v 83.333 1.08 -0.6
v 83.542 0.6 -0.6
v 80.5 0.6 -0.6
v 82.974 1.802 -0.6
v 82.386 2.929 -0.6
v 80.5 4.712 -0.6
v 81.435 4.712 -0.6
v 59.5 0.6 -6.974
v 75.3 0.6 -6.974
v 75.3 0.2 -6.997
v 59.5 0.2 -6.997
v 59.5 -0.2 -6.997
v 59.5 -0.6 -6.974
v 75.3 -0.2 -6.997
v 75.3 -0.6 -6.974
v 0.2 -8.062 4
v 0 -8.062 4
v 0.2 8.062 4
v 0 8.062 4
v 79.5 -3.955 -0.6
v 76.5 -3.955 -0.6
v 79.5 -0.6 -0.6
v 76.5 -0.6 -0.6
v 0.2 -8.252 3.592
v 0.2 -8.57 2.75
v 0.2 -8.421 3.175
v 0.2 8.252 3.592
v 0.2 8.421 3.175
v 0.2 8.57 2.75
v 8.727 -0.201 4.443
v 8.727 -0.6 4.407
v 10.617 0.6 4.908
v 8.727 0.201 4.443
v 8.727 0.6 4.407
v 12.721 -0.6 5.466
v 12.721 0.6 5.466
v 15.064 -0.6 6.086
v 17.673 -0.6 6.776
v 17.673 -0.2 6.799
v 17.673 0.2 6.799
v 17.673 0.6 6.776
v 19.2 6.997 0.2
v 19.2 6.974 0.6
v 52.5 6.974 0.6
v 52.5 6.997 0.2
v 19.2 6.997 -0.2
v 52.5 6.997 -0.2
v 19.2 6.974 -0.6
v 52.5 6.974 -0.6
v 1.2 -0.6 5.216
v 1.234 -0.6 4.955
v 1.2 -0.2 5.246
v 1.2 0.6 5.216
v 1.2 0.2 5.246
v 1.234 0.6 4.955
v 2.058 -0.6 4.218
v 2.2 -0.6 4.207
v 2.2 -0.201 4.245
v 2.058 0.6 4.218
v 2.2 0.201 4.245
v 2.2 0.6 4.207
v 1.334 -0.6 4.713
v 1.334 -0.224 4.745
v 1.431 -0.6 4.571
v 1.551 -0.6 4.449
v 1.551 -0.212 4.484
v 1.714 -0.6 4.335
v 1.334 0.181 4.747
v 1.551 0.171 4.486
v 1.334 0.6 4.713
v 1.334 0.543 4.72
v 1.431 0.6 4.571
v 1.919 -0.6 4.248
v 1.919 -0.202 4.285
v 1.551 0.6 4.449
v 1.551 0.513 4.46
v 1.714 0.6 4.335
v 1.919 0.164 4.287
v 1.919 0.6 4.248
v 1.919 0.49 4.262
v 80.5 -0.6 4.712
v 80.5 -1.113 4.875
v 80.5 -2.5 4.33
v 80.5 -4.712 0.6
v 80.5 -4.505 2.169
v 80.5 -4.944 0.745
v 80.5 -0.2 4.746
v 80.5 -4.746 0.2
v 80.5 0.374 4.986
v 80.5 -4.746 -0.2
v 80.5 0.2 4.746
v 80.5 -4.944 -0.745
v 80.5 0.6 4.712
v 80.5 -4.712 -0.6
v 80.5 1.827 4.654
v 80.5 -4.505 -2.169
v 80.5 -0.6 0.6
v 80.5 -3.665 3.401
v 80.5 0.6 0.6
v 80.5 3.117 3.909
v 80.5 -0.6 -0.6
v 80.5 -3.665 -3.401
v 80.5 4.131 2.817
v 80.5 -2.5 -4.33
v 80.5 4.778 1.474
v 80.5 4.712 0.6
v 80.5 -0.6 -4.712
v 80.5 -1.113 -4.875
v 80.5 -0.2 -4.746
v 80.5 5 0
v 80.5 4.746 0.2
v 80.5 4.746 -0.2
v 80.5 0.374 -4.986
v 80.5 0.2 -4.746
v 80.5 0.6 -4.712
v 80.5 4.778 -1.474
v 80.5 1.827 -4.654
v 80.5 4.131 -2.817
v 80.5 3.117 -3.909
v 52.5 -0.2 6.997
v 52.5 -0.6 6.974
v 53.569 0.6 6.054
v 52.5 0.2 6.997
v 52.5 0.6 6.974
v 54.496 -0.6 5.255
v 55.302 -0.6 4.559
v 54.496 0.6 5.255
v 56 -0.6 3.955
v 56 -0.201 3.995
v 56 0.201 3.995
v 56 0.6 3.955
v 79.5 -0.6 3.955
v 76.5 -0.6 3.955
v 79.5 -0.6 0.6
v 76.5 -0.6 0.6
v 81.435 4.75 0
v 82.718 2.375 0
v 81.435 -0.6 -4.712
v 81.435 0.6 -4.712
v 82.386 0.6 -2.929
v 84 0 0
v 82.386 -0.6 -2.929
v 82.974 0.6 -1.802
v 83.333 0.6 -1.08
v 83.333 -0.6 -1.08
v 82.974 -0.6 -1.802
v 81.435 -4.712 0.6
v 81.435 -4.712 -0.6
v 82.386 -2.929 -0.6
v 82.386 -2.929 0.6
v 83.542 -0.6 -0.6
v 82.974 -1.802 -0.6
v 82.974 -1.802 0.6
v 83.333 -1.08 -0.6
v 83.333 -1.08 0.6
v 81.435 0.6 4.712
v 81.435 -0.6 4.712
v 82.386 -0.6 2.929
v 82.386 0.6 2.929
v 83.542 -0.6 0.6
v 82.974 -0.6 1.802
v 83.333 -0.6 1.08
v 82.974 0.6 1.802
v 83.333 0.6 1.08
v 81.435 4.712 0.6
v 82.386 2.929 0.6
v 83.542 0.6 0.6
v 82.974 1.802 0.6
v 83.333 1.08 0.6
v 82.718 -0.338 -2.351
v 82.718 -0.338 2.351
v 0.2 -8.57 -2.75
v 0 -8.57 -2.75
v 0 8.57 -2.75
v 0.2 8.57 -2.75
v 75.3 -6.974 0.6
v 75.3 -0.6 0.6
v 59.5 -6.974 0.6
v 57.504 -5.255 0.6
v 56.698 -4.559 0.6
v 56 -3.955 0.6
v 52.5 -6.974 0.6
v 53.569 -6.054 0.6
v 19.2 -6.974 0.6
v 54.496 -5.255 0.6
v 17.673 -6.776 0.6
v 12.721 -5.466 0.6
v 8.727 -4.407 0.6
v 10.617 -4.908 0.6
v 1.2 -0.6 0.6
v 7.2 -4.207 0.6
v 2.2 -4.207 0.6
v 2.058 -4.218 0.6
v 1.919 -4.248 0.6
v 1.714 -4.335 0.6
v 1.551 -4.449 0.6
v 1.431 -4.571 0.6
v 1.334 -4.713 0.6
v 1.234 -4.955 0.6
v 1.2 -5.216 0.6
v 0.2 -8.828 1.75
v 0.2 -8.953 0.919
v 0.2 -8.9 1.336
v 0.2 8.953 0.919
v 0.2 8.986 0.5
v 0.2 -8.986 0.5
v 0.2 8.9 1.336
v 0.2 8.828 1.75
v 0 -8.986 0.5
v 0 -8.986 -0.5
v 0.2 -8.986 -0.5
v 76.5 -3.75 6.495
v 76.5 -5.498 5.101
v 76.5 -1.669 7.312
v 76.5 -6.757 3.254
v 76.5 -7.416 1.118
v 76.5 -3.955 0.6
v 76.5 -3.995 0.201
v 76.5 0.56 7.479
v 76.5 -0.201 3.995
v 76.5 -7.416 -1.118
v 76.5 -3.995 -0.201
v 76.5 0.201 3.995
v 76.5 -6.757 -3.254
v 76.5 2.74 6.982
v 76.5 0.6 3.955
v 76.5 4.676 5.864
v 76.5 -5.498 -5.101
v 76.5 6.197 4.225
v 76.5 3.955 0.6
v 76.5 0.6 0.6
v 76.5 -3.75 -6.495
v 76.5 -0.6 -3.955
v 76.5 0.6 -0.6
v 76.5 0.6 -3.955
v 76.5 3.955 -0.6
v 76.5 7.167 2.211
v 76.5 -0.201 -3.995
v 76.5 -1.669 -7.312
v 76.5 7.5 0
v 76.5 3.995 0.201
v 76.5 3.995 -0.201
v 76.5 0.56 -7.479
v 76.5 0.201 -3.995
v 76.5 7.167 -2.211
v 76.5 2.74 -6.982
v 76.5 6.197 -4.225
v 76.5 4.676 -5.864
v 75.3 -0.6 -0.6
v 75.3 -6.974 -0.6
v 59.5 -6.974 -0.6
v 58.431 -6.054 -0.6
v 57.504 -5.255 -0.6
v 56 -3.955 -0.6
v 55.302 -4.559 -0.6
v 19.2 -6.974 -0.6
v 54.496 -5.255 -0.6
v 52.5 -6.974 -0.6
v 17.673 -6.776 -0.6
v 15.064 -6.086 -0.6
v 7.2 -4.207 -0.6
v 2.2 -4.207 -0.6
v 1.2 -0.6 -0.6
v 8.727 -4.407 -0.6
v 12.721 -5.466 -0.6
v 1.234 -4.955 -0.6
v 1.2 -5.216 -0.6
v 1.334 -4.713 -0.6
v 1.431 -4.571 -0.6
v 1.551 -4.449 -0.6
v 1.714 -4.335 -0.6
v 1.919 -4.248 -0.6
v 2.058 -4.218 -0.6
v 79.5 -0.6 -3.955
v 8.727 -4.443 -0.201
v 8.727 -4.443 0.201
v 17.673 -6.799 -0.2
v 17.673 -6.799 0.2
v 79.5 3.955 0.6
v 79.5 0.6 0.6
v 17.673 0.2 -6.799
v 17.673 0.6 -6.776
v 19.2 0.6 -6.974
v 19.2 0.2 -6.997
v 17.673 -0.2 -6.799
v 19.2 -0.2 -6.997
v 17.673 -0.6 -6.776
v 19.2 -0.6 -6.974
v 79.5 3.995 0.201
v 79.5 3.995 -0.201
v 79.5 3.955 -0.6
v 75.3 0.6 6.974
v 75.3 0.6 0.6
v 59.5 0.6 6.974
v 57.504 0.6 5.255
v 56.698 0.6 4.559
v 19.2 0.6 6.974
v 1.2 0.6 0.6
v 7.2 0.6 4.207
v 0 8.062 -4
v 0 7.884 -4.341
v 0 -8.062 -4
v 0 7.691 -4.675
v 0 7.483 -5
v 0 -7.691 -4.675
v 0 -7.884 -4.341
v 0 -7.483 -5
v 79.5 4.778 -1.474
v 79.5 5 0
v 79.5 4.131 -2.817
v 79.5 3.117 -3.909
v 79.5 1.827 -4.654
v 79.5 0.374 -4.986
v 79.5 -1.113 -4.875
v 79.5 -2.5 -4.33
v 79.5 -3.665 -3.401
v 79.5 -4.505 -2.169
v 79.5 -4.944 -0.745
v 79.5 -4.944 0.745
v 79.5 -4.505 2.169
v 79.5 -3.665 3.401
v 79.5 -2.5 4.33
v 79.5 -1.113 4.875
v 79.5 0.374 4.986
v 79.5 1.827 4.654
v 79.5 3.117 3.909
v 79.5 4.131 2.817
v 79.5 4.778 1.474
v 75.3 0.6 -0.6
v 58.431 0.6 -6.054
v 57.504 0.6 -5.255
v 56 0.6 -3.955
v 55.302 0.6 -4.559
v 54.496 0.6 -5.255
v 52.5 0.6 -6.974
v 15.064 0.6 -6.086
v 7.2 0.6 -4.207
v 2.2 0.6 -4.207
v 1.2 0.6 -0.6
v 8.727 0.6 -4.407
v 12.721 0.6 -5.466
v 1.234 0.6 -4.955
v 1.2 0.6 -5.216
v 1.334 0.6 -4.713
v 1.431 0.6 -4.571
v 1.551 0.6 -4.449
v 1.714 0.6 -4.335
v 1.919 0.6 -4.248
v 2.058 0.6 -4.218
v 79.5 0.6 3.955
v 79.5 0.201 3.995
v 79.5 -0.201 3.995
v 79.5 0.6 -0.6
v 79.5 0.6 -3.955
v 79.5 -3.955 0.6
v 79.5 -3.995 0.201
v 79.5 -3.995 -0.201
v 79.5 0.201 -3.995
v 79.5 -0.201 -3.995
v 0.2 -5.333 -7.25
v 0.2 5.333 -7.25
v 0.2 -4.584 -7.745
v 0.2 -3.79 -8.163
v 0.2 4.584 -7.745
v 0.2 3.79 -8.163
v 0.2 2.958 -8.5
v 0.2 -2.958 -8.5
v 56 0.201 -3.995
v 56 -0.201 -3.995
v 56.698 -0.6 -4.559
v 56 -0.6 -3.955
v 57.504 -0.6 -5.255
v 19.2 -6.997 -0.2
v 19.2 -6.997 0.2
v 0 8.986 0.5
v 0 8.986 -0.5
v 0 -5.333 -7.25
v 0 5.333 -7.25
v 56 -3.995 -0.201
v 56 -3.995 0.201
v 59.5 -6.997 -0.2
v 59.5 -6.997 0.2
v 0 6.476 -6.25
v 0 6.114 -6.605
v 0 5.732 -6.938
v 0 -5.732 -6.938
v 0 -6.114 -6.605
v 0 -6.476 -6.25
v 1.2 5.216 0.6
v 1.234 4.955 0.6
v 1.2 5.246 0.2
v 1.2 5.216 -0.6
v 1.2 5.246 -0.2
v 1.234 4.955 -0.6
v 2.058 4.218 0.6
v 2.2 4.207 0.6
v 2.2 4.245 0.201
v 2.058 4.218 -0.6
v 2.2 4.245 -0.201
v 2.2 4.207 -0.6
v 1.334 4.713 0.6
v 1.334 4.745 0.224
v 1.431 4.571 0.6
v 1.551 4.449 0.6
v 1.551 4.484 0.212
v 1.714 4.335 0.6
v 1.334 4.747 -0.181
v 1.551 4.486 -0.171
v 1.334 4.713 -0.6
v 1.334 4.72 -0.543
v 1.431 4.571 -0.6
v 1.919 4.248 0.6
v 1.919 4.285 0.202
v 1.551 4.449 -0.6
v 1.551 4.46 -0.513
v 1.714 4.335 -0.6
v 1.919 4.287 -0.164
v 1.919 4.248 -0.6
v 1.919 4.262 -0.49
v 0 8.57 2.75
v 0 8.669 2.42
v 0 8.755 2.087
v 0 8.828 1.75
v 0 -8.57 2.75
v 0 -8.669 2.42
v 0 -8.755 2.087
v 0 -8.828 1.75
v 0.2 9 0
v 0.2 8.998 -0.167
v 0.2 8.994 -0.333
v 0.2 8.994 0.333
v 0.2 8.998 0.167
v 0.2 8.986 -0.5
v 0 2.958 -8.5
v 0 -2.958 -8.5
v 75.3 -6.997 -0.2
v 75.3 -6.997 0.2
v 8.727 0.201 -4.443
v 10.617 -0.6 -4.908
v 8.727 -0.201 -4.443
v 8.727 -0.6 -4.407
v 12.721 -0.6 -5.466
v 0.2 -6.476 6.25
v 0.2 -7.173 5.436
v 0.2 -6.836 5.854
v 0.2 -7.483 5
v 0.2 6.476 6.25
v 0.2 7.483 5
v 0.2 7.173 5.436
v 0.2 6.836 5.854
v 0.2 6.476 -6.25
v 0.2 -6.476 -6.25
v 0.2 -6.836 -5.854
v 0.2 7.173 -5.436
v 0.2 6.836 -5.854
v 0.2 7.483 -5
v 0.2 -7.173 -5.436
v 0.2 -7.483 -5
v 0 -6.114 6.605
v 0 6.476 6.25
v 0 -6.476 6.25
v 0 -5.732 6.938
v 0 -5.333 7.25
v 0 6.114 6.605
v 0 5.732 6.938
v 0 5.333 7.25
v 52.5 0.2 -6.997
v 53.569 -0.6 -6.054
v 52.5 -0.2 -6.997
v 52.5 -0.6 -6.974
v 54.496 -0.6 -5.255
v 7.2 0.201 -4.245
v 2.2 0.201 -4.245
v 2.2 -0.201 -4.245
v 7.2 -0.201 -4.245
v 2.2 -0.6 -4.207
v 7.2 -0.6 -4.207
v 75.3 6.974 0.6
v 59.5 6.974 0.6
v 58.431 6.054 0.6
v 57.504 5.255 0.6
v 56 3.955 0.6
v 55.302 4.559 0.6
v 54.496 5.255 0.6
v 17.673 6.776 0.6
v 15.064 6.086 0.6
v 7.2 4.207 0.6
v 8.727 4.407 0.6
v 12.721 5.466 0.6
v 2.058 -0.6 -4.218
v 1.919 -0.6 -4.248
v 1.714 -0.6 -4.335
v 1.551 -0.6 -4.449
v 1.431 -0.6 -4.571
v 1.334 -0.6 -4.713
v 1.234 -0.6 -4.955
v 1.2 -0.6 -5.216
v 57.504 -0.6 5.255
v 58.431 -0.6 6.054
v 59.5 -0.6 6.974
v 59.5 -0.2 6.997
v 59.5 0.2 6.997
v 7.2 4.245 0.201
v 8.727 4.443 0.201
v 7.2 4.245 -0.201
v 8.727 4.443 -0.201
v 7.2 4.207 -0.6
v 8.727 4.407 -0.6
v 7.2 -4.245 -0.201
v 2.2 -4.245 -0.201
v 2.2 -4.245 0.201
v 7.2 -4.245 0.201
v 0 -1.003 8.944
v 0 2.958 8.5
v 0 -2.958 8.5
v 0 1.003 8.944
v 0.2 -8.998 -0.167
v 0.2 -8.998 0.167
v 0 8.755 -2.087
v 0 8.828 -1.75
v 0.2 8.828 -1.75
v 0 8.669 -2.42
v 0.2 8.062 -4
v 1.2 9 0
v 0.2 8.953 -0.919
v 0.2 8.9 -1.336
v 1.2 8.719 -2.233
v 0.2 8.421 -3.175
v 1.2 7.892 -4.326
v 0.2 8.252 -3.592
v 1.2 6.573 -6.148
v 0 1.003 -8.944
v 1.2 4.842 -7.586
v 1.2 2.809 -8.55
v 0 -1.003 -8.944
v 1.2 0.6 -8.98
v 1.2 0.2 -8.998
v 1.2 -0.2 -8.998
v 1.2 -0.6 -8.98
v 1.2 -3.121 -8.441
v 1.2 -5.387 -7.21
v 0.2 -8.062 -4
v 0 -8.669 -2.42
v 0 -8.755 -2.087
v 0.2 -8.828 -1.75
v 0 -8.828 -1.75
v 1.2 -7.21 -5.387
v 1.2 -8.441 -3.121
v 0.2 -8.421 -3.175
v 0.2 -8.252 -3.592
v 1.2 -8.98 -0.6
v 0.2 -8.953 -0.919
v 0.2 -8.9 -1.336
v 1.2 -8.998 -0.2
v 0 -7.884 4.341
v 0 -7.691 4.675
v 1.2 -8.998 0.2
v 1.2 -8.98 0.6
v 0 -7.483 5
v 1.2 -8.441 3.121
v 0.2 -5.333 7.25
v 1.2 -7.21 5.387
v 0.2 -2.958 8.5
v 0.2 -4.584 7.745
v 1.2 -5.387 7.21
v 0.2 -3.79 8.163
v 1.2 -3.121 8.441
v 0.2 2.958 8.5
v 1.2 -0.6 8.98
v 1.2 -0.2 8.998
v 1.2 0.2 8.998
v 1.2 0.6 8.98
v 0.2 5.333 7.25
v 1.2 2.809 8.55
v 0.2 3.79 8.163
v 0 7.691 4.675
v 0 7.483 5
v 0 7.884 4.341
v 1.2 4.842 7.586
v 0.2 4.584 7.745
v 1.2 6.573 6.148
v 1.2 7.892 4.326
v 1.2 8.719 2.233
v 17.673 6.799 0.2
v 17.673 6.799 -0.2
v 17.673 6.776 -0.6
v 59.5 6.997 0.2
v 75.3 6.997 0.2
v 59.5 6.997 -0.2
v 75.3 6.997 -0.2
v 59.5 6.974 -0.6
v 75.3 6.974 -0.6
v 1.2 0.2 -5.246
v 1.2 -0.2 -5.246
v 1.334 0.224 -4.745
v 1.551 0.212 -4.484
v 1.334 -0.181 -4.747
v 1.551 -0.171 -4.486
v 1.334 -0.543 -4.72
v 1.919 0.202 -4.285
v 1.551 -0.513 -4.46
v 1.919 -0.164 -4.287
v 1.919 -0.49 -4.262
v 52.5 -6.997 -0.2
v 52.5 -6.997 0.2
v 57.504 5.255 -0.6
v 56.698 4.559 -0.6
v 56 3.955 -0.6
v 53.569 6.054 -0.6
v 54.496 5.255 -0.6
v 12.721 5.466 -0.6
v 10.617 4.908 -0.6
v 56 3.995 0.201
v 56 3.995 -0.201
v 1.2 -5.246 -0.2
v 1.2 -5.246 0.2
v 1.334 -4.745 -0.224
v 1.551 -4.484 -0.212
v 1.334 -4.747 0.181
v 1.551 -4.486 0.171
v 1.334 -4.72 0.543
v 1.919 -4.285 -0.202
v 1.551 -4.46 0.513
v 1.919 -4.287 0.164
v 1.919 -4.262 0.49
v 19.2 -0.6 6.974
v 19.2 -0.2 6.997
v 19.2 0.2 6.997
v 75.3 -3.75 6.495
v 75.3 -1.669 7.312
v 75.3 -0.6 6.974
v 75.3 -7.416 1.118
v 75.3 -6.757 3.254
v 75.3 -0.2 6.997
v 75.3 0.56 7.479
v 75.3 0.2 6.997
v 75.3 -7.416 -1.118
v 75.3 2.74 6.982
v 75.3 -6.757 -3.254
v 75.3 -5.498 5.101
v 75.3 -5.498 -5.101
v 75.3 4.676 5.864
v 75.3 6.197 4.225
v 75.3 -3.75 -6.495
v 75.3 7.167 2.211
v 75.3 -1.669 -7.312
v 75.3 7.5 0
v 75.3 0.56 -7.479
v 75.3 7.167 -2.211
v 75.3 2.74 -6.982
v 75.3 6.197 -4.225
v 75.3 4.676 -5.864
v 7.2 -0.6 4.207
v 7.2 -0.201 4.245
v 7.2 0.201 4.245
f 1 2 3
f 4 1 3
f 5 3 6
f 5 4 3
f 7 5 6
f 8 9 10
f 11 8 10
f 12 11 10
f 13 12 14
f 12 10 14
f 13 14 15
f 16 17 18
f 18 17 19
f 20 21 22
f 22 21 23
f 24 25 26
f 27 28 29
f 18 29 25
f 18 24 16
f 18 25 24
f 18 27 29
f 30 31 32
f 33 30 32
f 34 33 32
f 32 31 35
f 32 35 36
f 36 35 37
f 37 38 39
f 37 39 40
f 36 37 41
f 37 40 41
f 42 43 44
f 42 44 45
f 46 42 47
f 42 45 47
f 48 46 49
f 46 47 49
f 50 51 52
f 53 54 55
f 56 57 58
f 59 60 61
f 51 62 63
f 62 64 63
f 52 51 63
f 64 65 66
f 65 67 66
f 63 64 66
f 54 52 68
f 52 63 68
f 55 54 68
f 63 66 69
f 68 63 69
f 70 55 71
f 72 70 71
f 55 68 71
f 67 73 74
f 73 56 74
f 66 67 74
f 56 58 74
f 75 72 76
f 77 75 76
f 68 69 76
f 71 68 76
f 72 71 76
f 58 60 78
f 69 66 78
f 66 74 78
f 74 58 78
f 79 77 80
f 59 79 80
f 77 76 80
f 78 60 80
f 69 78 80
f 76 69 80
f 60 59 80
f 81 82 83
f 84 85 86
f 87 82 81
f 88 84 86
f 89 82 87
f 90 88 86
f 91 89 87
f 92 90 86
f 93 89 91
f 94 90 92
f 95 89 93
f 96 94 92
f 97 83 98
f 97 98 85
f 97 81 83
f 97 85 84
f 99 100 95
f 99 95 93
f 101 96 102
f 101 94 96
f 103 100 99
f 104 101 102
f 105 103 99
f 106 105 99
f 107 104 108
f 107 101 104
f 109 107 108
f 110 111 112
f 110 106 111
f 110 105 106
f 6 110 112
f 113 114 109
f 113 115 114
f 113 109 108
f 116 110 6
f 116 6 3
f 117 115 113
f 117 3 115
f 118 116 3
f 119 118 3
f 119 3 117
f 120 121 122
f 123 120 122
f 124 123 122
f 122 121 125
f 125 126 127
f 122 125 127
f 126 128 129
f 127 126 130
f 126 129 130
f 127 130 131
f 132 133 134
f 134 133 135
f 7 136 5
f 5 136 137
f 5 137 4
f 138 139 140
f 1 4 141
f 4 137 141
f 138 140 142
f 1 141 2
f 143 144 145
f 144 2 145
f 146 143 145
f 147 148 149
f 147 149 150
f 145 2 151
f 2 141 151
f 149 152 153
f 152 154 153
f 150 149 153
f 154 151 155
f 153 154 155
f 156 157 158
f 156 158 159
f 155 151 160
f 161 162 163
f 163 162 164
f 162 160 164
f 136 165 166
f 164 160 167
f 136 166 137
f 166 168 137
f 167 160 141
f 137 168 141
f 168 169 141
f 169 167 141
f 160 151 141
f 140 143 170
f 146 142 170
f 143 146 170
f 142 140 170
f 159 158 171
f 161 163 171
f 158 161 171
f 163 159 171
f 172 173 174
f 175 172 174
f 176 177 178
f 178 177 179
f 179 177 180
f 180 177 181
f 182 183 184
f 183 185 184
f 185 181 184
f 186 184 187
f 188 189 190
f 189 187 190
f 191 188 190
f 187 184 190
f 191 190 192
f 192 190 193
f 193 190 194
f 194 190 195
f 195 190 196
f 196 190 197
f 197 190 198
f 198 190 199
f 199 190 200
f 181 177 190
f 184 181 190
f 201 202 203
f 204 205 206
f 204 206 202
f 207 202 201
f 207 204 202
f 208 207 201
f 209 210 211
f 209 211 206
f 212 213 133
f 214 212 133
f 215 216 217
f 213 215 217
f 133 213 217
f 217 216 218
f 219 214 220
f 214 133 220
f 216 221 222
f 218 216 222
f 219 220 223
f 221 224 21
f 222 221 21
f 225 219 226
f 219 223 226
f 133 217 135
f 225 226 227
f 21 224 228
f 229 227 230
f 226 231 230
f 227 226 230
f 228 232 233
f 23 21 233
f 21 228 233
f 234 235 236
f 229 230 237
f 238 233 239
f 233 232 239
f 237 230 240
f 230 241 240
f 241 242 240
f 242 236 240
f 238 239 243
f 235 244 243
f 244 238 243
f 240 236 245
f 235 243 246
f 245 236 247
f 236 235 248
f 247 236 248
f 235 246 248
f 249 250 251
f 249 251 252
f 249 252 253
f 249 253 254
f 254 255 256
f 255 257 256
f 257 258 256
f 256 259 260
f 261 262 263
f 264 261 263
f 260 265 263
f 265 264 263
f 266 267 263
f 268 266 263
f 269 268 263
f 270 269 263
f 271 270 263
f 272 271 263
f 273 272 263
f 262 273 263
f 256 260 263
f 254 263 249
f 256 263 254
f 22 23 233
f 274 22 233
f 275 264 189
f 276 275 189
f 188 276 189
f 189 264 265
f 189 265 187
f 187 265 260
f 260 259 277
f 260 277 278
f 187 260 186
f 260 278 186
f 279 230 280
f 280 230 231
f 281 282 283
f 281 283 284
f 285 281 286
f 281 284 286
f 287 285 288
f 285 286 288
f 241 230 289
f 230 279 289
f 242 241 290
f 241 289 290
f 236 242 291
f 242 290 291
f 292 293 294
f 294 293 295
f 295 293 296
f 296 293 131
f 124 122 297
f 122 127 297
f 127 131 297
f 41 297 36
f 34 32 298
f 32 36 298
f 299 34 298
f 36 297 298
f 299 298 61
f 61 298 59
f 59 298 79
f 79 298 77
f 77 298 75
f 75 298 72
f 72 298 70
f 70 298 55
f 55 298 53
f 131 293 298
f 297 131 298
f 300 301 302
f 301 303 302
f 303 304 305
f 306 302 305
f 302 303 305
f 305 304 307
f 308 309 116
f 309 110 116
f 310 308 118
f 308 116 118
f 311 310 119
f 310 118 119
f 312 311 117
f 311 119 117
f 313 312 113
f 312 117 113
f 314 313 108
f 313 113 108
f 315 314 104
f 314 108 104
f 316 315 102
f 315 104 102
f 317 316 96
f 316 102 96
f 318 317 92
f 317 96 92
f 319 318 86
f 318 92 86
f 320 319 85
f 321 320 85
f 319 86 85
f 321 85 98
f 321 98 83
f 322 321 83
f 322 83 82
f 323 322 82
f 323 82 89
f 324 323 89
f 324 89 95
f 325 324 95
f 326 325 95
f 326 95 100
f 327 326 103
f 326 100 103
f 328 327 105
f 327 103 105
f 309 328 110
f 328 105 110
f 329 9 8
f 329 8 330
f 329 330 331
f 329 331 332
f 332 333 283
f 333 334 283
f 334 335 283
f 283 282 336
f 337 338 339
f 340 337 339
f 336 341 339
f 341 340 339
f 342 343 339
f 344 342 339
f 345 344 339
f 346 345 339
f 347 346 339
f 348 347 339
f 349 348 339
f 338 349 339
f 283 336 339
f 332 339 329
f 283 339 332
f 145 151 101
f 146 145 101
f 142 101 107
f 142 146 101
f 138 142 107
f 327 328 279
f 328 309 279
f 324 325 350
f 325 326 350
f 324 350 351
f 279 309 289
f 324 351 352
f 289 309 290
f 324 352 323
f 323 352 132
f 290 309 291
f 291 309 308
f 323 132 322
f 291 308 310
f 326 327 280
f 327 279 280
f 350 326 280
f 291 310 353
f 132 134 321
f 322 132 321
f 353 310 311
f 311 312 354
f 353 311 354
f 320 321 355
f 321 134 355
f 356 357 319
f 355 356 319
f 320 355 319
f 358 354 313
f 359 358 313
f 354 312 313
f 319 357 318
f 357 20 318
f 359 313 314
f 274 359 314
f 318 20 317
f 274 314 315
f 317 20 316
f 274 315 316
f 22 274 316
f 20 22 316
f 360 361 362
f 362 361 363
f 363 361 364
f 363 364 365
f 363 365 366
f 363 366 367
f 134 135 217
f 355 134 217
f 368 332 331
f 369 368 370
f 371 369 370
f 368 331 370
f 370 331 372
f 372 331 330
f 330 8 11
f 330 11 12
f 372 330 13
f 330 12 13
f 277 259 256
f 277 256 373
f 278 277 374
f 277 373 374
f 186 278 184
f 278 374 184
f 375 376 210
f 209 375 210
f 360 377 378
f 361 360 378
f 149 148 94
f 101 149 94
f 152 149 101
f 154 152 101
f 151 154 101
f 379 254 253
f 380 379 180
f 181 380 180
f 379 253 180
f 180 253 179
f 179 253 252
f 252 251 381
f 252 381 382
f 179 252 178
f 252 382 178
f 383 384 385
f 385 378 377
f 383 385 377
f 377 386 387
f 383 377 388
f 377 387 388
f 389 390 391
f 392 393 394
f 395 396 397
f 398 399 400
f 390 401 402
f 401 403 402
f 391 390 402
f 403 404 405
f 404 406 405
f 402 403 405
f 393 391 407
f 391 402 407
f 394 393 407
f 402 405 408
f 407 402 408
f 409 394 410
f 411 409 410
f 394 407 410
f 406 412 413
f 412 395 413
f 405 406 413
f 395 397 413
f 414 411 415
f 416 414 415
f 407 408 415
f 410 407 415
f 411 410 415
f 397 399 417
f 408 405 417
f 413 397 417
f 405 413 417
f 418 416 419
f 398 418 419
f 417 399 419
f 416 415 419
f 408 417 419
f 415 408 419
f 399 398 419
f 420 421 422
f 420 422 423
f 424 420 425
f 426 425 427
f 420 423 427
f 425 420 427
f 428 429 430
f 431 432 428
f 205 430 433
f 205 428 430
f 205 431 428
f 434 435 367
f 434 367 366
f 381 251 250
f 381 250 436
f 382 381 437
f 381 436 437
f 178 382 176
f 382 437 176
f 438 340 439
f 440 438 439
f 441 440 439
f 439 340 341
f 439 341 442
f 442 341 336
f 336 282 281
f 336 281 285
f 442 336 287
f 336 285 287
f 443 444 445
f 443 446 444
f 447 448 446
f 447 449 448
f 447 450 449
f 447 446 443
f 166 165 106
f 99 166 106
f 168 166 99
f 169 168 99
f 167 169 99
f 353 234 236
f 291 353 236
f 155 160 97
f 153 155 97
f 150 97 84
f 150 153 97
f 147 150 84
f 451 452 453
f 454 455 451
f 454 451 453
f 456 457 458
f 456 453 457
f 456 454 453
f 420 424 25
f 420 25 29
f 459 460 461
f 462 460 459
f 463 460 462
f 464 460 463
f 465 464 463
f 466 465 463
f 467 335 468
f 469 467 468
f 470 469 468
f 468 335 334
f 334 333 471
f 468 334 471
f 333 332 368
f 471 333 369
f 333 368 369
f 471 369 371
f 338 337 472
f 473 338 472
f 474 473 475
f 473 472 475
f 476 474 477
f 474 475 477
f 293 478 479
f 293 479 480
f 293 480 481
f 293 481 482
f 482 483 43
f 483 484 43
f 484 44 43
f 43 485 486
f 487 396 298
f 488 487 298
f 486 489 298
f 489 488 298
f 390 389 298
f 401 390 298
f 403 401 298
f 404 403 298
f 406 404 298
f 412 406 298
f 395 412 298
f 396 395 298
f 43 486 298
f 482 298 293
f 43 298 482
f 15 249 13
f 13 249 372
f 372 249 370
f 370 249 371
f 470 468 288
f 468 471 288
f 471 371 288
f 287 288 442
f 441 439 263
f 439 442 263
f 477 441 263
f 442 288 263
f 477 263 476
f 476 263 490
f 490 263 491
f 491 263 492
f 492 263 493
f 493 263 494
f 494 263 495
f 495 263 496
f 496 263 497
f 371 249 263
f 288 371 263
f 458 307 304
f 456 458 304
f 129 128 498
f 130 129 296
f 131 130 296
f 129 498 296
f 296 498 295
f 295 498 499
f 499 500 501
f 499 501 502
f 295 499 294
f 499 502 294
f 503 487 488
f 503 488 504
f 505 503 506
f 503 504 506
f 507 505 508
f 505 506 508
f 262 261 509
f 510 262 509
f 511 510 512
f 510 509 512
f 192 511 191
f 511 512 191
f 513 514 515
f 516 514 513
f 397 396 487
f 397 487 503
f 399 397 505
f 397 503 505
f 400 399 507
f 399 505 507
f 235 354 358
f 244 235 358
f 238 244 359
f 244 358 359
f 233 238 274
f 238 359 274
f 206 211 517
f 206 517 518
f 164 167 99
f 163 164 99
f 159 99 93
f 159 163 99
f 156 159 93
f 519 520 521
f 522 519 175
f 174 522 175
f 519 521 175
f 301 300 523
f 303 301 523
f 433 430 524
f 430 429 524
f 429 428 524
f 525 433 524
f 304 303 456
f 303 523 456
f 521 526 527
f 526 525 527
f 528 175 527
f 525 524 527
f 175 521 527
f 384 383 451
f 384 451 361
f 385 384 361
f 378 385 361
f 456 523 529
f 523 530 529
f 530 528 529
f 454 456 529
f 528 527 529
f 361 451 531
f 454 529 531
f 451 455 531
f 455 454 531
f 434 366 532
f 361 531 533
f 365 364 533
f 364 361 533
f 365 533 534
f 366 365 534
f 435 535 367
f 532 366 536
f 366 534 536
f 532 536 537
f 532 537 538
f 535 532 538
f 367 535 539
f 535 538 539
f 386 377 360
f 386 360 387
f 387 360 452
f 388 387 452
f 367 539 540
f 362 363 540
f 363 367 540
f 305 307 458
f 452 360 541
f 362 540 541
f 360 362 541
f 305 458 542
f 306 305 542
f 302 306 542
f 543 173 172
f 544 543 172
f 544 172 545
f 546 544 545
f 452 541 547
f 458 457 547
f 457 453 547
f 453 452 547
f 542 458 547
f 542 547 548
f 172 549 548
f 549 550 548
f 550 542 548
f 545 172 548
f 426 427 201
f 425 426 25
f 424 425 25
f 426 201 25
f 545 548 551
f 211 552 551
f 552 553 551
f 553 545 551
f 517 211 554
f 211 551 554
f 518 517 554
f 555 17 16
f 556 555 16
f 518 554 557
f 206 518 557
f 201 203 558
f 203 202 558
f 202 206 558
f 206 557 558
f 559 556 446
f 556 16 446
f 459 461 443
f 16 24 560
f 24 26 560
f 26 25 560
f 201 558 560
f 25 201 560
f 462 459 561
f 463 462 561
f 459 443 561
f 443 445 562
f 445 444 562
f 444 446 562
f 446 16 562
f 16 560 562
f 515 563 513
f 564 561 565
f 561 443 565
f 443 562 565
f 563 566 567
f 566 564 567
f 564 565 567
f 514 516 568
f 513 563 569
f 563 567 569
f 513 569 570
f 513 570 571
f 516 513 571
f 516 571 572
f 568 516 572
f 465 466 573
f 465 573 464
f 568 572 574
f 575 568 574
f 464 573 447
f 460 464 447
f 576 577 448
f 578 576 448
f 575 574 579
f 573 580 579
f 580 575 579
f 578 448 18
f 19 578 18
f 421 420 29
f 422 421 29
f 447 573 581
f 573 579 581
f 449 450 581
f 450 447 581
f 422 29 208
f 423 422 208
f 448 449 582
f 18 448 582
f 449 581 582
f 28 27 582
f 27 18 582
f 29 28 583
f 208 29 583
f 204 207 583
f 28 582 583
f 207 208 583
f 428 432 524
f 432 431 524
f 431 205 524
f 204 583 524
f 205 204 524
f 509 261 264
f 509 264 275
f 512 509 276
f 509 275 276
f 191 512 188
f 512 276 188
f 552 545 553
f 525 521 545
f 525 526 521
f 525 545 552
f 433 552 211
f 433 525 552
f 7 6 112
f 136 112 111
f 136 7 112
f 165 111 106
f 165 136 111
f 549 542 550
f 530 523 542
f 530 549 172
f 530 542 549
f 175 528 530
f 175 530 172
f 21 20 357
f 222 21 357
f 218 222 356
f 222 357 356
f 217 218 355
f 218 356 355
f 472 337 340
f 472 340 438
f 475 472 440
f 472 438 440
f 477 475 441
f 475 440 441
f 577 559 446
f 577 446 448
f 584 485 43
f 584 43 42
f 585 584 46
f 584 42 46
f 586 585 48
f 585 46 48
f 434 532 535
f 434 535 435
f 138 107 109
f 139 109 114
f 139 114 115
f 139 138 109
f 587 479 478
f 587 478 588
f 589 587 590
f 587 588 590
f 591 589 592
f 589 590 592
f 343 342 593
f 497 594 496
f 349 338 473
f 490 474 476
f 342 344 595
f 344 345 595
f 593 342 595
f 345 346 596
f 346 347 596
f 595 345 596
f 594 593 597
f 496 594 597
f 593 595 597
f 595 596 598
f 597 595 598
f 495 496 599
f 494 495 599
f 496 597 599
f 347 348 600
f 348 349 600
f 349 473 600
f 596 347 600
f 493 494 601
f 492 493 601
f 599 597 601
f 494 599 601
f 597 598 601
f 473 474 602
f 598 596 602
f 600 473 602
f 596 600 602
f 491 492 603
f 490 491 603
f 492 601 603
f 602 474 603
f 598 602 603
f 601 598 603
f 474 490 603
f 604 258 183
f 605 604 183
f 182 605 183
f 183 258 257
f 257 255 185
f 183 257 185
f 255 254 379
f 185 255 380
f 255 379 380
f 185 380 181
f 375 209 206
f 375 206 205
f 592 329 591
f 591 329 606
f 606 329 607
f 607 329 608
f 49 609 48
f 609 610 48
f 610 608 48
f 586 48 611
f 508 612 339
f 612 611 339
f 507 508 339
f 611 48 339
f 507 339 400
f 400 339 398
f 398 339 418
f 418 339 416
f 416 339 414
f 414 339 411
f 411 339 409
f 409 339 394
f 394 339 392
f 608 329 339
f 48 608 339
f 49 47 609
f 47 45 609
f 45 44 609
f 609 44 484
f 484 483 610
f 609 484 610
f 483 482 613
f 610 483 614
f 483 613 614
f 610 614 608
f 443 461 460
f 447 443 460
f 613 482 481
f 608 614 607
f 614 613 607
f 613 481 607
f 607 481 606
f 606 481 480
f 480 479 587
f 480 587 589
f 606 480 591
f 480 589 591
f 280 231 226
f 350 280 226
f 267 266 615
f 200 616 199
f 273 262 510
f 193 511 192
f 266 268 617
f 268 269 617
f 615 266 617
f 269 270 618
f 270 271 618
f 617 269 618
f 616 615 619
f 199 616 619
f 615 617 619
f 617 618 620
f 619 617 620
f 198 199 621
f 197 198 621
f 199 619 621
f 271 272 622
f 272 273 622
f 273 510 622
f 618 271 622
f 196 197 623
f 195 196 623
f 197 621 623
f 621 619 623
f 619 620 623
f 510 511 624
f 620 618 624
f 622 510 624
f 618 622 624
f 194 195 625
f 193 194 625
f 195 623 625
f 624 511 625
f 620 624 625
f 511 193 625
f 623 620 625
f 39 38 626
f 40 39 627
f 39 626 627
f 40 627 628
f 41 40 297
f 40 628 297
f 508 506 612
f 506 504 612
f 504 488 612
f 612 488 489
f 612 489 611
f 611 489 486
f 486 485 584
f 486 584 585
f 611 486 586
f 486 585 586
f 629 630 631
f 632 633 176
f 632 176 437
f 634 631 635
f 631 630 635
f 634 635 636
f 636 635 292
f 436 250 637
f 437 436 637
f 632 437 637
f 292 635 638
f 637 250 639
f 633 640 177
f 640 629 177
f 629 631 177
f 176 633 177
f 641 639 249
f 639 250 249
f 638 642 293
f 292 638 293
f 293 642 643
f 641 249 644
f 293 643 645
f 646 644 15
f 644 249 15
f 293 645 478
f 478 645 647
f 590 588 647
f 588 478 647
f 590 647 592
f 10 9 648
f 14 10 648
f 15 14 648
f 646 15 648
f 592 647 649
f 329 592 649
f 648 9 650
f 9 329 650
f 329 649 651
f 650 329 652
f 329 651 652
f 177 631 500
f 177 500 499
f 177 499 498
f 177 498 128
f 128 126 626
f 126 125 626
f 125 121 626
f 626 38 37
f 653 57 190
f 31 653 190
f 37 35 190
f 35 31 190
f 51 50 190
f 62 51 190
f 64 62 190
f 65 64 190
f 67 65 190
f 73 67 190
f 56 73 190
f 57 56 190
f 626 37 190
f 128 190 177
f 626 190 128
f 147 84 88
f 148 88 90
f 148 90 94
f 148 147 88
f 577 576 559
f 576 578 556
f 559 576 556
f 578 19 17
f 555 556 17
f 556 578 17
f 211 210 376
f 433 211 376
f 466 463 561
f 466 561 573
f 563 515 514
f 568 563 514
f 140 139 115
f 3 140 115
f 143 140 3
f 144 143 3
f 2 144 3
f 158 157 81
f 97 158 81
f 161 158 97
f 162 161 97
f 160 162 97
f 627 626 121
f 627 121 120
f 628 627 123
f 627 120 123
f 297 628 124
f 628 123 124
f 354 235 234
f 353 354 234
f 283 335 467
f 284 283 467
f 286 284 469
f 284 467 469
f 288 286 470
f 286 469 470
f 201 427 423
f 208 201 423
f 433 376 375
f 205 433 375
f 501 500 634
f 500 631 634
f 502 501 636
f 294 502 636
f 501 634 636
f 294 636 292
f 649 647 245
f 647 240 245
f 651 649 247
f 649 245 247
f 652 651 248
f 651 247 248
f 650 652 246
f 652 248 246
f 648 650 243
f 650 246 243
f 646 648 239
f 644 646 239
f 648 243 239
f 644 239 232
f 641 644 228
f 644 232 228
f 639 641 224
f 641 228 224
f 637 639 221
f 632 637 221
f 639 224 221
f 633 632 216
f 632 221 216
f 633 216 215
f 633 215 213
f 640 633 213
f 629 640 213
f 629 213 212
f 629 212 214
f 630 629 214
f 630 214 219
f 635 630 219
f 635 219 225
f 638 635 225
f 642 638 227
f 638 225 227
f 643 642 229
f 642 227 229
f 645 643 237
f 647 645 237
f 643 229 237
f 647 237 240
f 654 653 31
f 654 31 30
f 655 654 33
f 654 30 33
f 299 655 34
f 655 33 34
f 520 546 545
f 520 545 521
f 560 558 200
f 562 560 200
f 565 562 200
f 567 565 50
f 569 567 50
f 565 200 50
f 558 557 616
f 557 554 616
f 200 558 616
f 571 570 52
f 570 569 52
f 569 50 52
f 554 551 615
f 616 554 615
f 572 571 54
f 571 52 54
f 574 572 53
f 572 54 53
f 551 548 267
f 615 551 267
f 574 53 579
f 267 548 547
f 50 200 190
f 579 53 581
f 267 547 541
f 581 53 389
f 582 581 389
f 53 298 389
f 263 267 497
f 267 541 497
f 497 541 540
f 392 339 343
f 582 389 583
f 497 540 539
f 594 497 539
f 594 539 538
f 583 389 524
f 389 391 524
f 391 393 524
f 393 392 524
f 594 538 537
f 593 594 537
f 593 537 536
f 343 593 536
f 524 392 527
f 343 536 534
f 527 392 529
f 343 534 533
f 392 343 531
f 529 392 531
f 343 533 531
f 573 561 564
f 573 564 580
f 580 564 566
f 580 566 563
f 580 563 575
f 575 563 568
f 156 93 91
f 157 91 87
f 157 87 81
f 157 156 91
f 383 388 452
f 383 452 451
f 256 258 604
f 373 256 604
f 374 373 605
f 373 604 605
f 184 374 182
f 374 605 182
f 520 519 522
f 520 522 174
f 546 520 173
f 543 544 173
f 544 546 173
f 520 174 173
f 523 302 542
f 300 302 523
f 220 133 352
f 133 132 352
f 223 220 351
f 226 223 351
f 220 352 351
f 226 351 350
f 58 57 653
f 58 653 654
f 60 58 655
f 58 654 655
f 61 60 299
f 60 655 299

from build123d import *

# Parameters (mm, degrees)
SKETCH2_OUTSIDE_W   = 37.554
SKETCH2_OUTSIDE_H   = 37.554
CUT_EXTRUDE1_DEPTH  = 74.1
SKETCH3_OUTSIDE_W   = 37.554
SKETCH3_OUTSIDE_H   = 37.554
SKETCH3_OUTSIDE_W_2 = 1
SKETCH3_OUTSIDE_H_2 = 17.972200756
CUT_EXTRUDE2_DEPTH  = 0.2
SKETCH4_OUTSIDE_W   = 37.554
SKETCH4_OUTSIDE_H   = 37.554
CUT_EXTRUDE3_DEPTH  = 3
SKETCH5_OUTSIDE_W   = 37.554
SKETCH5_OUTSIDE_H   = 37.554
CUT_EXTRUDE4_DEPTH  = 3.5


with BuildPart() as part:
    # Sketch1 → Revolve1 (revolve)
    with BuildSketch(Plane.XY):
        with BuildLine():
            Line((0, 0), (0, 9))
            Line((0, 9), (1.2, 9))
            Line((1.2, 9), (1.2, 5.25))
            ThreePointArc((1.2, 5.25), (1.492893219, 4.542893219), (2.2, 4.25))
            Line((2.2, 4.25), (7.2, 4.25))
            ThreePointArc((7.2, 4.25), (7.970049199, 4.299619825), (8.72736183, 4.44765859))
            Line((8.72736183, 4.44765859), (17.67263817, 6.80234141))
            ThreePointArc((17.67263817, 6.80234141), (18.429950801, 6.950380175), (19.2, 7))
            Line((19.2, 7), (52.5, 7))
            Line((52.5, 7), (56, 4))
            Line((56, 4), (59.5, 7))
            Line((59.5, 7), (75.3, 7))
            Line((75.3, 7), (75.3, 7.5))
            Line((75.3, 7.5), (76.5, 7.5))
            Line((76.5, 7.5), (76.5, 4))
            Line((76.5, 4), (79.5, 4))
            Line((79.5, 4), (79.5, 5))
            Line((79.5, 5), (81.3, 5))
            Line((81.3, 5), (84, 0))
            Line((84, 0), (0, 0))
        make_face()
    revolve(axis=Axis((84, 0, 0), (-1, 0, 0)))

    # Sketch2 outside → Cut-Extrude1 (cut)
    with BuildSketch(Plane(origin=(1.2, 0, 0), x_dir=(0, 0, -1), z_dir=(1, 0, 0))):
        Rectangle(SKETCH2_OUTSIDE_W, SKETCH2_OUTSIDE_H)
        with BuildLine():
            Line((-0.6, 8.979977728), (-0.6, 0.6))
            Line((-0.6, 0.6), (-8.979977728, 0.6))
            ThreePointArc((-8.979977728, 0.6), (-9, 0), (-8.979977728, -0.6))
            Line((-8.979977728, -0.6), (-0.6, -0.6))
            Line((-0.6, -0.6), (-0.6, -8.979977728))
            ThreePointArc((-0.6, -8.979977728), (0, -9), (0.6, -8.979977728))
            Line((0.6, -8.979977728), (0.6, -0.6))
            Line((0.6, -0.6), (8.979977728, -0.6))
            ThreePointArc((8.979977728, -0.6), (9, 0), (8.979977728, 0.6))
            Line((8.979977728, 0.6), (0.6, 0.6))
            Line((0.6, 0.6), (0.6, 8.979977728))
            ThreePointArc((0.6, 8.979977728), (0, 9), (-0.6, 8.979977728))
        make_face(mode=Mode.SUBTRACT)
    extrude(amount=CUT_EXTRUDE1_DEPTH, mode=Mode.SUBTRACT)

    # Sketch3 outside → Cut-Extrude2 (cut)
    with BuildSketch(Plane.ZY):
        Rectangle(SKETCH3_OUTSIDE_W, SKETCH3_OUTSIDE_H)
        with Locations((2.25, 0)):
            Rectangle(SKETCH3_OUTSIDE_W_2, SKETCH3_OUTSIDE_H_2, mode=Mode.SUBTRACT)
        Rectangle(SKETCH3_OUTSIDE_W_2, SKETCH3_OUTSIDE_H_2, mode=Mode.SUBTRACT)
        with Locations((4.5, 0)):
            Rectangle(SKETCH3_OUTSIDE_W_2, SKETCH3_OUTSIDE_H_2, mode=Mode.SUBTRACT)
        with Locations((6.75, 0)):
            Rectangle(SKETCH3_OUTSIDE_W_2, SKETCH3_OUTSIDE_H_2, mode=Mode.SUBTRACT)
        with Locations((9, 0)):
            Rectangle(SKETCH3_OUTSIDE_W_2, SKETCH3_OUTSIDE_H_2, mode=Mode.SUBTRACT)
        with Locations((11.25, 0)):
            Rectangle(SKETCH3_OUTSIDE_W_2, SKETCH3_OUTSIDE_H_2, mode=Mode.SUBTRACT)
        with Locations((13.5, 0)):
            Rectangle(SKETCH3_OUTSIDE_W_2, SKETCH3_OUTSIDE_H_2, mode=Mode.SUBTRACT)
        with Locations((-2.25, 0)):
            Rectangle(SKETCH3_OUTSIDE_W_2, SKETCH3_OUTSIDE_H_2, mode=Mode.SUBTRACT)
        with Locations((-4.5, 0)):
            Rectangle(SKETCH3_OUTSIDE_W_2, SKETCH3_OUTSIDE_H_2, mode=Mode.SUBTRACT)
        with Locations((-6.75, 0)):
            Rectangle(SKETCH3_OUTSIDE_W_2, SKETCH3_OUTSIDE_H_2, mode=Mode.SUBTRACT)
        with Locations((-9, 0)):
            Rectangle(SKETCH3_OUTSIDE_W_2, SKETCH3_OUTSIDE_H_2, mode=Mode.SUBTRACT)
        with Locations((-11.25, 0)):
            Rectangle(SKETCH3_OUTSIDE_W_2, SKETCH3_OUTSIDE_H_2, mode=Mode.SUBTRACT)
        with Locations((-13.5, 0)):
            Rectangle(SKETCH3_OUTSIDE_W_2, SKETCH3_OUTSIDE_H_2, mode=Mode.SUBTRACT)
    extrude(amount=-CUT_EXTRUDE2_DEPTH, mode=Mode.SUBTRACT)

    # Sketch4 outside → Cut-Extrude3 (cut)
    with BuildSketch(Plane(origin=(76.5, 0, 0), x_dir=(0, 0, -1), z_dir=(1, 0, 0))):
        Rectangle(SKETCH4_OUTSIDE_W, SKETCH4_OUTSIDE_H)
        with BuildLine():
            Line((0.6, 0.6), (0.6, 8.979977728))
            ThreePointArc((0.6, 8.979977728), (0, 9), (-0.6, 8.979977728))
            Line((-0.6, 8.979977728), (-0.6, 0.6))
            Line((-0.6, 0.6), (-8.979977728, 0.6))
            ThreePointArc((-8.979977728, 0.6), (-9, 0), (-8.979977728, -0.6))
            Line((-8.979977728, -0.6), (-0.6, -0.6))
            Line((-0.6, -0.6), (-0.6, -8.979977728))
            ThreePointArc((-0.6, -8.979977728), (0, -9), (0.6, -8.979977728))
            Line((0.6, -8.979977728), (0.6, -0.6))
            Line((0.6, -0.6), (8.979977728, -0.6))
            ThreePointArc((8.979977728, -0.6), (9, 0), (8.979977728, 0.6))
            Line((8.979977728, 0.6), (0.6, 0.6))
        make_face(mode=Mode.SUBTRACT)
    extrude(amount=CUT_EXTRUDE3_DEPTH, mode=Mode.SUBTRACT)

    # Sketch5 outside → Cut-Extrude4 (cut)
    with BuildSketch(Plane(origin=(84, 0, 0), x_dir=(0, 0, -1), z_dir=(1, 0, 0))):
        Rectangle(SKETCH5_OUTSIDE_W, SKETCH5_OUTSIDE_H)
        with BuildLine():
            Line((0.6, 0.6), (0.6, 4.711952886))
            ThreePointArc((0.6, 4.711952886), (0, 4.75), (-0.6, 4.711952886))
            Line((-0.6, 4.711952886), (-0.6, 0.6))
            Line((-0.6, 0.6), (-4.711952886, 0.6))
            ThreePointArc((-4.711952886, 0.6), (-4.75, 0), (-4.711952886, -0.6))
            Line((-4.711952886, -0.6), (-0.6, -0.6))
            Line((-0.6, -0.6), (-0.6, -4.711952886))
            ThreePointArc((-0.6, -4.711952886), (0, -4.75), (0.6, -4.711952886))
            Line((0.6, -4.711952886), (0.6, -0.6))
            Line((0.6, -0.6), (4.711952886, -0.6))
            ThreePointArc((4.711952886, -0.6), (4.75, 0), (4.711952886, 0.6))
            Line((4.711952886, 0.6), (0.6, 0.6))
        make_face(mode=Mode.SUBTRACT)
    extrude(amount=-CUT_EXTRUDE4_DEPTH, mode=Mode.SUBTRACT)


solid = part.part
